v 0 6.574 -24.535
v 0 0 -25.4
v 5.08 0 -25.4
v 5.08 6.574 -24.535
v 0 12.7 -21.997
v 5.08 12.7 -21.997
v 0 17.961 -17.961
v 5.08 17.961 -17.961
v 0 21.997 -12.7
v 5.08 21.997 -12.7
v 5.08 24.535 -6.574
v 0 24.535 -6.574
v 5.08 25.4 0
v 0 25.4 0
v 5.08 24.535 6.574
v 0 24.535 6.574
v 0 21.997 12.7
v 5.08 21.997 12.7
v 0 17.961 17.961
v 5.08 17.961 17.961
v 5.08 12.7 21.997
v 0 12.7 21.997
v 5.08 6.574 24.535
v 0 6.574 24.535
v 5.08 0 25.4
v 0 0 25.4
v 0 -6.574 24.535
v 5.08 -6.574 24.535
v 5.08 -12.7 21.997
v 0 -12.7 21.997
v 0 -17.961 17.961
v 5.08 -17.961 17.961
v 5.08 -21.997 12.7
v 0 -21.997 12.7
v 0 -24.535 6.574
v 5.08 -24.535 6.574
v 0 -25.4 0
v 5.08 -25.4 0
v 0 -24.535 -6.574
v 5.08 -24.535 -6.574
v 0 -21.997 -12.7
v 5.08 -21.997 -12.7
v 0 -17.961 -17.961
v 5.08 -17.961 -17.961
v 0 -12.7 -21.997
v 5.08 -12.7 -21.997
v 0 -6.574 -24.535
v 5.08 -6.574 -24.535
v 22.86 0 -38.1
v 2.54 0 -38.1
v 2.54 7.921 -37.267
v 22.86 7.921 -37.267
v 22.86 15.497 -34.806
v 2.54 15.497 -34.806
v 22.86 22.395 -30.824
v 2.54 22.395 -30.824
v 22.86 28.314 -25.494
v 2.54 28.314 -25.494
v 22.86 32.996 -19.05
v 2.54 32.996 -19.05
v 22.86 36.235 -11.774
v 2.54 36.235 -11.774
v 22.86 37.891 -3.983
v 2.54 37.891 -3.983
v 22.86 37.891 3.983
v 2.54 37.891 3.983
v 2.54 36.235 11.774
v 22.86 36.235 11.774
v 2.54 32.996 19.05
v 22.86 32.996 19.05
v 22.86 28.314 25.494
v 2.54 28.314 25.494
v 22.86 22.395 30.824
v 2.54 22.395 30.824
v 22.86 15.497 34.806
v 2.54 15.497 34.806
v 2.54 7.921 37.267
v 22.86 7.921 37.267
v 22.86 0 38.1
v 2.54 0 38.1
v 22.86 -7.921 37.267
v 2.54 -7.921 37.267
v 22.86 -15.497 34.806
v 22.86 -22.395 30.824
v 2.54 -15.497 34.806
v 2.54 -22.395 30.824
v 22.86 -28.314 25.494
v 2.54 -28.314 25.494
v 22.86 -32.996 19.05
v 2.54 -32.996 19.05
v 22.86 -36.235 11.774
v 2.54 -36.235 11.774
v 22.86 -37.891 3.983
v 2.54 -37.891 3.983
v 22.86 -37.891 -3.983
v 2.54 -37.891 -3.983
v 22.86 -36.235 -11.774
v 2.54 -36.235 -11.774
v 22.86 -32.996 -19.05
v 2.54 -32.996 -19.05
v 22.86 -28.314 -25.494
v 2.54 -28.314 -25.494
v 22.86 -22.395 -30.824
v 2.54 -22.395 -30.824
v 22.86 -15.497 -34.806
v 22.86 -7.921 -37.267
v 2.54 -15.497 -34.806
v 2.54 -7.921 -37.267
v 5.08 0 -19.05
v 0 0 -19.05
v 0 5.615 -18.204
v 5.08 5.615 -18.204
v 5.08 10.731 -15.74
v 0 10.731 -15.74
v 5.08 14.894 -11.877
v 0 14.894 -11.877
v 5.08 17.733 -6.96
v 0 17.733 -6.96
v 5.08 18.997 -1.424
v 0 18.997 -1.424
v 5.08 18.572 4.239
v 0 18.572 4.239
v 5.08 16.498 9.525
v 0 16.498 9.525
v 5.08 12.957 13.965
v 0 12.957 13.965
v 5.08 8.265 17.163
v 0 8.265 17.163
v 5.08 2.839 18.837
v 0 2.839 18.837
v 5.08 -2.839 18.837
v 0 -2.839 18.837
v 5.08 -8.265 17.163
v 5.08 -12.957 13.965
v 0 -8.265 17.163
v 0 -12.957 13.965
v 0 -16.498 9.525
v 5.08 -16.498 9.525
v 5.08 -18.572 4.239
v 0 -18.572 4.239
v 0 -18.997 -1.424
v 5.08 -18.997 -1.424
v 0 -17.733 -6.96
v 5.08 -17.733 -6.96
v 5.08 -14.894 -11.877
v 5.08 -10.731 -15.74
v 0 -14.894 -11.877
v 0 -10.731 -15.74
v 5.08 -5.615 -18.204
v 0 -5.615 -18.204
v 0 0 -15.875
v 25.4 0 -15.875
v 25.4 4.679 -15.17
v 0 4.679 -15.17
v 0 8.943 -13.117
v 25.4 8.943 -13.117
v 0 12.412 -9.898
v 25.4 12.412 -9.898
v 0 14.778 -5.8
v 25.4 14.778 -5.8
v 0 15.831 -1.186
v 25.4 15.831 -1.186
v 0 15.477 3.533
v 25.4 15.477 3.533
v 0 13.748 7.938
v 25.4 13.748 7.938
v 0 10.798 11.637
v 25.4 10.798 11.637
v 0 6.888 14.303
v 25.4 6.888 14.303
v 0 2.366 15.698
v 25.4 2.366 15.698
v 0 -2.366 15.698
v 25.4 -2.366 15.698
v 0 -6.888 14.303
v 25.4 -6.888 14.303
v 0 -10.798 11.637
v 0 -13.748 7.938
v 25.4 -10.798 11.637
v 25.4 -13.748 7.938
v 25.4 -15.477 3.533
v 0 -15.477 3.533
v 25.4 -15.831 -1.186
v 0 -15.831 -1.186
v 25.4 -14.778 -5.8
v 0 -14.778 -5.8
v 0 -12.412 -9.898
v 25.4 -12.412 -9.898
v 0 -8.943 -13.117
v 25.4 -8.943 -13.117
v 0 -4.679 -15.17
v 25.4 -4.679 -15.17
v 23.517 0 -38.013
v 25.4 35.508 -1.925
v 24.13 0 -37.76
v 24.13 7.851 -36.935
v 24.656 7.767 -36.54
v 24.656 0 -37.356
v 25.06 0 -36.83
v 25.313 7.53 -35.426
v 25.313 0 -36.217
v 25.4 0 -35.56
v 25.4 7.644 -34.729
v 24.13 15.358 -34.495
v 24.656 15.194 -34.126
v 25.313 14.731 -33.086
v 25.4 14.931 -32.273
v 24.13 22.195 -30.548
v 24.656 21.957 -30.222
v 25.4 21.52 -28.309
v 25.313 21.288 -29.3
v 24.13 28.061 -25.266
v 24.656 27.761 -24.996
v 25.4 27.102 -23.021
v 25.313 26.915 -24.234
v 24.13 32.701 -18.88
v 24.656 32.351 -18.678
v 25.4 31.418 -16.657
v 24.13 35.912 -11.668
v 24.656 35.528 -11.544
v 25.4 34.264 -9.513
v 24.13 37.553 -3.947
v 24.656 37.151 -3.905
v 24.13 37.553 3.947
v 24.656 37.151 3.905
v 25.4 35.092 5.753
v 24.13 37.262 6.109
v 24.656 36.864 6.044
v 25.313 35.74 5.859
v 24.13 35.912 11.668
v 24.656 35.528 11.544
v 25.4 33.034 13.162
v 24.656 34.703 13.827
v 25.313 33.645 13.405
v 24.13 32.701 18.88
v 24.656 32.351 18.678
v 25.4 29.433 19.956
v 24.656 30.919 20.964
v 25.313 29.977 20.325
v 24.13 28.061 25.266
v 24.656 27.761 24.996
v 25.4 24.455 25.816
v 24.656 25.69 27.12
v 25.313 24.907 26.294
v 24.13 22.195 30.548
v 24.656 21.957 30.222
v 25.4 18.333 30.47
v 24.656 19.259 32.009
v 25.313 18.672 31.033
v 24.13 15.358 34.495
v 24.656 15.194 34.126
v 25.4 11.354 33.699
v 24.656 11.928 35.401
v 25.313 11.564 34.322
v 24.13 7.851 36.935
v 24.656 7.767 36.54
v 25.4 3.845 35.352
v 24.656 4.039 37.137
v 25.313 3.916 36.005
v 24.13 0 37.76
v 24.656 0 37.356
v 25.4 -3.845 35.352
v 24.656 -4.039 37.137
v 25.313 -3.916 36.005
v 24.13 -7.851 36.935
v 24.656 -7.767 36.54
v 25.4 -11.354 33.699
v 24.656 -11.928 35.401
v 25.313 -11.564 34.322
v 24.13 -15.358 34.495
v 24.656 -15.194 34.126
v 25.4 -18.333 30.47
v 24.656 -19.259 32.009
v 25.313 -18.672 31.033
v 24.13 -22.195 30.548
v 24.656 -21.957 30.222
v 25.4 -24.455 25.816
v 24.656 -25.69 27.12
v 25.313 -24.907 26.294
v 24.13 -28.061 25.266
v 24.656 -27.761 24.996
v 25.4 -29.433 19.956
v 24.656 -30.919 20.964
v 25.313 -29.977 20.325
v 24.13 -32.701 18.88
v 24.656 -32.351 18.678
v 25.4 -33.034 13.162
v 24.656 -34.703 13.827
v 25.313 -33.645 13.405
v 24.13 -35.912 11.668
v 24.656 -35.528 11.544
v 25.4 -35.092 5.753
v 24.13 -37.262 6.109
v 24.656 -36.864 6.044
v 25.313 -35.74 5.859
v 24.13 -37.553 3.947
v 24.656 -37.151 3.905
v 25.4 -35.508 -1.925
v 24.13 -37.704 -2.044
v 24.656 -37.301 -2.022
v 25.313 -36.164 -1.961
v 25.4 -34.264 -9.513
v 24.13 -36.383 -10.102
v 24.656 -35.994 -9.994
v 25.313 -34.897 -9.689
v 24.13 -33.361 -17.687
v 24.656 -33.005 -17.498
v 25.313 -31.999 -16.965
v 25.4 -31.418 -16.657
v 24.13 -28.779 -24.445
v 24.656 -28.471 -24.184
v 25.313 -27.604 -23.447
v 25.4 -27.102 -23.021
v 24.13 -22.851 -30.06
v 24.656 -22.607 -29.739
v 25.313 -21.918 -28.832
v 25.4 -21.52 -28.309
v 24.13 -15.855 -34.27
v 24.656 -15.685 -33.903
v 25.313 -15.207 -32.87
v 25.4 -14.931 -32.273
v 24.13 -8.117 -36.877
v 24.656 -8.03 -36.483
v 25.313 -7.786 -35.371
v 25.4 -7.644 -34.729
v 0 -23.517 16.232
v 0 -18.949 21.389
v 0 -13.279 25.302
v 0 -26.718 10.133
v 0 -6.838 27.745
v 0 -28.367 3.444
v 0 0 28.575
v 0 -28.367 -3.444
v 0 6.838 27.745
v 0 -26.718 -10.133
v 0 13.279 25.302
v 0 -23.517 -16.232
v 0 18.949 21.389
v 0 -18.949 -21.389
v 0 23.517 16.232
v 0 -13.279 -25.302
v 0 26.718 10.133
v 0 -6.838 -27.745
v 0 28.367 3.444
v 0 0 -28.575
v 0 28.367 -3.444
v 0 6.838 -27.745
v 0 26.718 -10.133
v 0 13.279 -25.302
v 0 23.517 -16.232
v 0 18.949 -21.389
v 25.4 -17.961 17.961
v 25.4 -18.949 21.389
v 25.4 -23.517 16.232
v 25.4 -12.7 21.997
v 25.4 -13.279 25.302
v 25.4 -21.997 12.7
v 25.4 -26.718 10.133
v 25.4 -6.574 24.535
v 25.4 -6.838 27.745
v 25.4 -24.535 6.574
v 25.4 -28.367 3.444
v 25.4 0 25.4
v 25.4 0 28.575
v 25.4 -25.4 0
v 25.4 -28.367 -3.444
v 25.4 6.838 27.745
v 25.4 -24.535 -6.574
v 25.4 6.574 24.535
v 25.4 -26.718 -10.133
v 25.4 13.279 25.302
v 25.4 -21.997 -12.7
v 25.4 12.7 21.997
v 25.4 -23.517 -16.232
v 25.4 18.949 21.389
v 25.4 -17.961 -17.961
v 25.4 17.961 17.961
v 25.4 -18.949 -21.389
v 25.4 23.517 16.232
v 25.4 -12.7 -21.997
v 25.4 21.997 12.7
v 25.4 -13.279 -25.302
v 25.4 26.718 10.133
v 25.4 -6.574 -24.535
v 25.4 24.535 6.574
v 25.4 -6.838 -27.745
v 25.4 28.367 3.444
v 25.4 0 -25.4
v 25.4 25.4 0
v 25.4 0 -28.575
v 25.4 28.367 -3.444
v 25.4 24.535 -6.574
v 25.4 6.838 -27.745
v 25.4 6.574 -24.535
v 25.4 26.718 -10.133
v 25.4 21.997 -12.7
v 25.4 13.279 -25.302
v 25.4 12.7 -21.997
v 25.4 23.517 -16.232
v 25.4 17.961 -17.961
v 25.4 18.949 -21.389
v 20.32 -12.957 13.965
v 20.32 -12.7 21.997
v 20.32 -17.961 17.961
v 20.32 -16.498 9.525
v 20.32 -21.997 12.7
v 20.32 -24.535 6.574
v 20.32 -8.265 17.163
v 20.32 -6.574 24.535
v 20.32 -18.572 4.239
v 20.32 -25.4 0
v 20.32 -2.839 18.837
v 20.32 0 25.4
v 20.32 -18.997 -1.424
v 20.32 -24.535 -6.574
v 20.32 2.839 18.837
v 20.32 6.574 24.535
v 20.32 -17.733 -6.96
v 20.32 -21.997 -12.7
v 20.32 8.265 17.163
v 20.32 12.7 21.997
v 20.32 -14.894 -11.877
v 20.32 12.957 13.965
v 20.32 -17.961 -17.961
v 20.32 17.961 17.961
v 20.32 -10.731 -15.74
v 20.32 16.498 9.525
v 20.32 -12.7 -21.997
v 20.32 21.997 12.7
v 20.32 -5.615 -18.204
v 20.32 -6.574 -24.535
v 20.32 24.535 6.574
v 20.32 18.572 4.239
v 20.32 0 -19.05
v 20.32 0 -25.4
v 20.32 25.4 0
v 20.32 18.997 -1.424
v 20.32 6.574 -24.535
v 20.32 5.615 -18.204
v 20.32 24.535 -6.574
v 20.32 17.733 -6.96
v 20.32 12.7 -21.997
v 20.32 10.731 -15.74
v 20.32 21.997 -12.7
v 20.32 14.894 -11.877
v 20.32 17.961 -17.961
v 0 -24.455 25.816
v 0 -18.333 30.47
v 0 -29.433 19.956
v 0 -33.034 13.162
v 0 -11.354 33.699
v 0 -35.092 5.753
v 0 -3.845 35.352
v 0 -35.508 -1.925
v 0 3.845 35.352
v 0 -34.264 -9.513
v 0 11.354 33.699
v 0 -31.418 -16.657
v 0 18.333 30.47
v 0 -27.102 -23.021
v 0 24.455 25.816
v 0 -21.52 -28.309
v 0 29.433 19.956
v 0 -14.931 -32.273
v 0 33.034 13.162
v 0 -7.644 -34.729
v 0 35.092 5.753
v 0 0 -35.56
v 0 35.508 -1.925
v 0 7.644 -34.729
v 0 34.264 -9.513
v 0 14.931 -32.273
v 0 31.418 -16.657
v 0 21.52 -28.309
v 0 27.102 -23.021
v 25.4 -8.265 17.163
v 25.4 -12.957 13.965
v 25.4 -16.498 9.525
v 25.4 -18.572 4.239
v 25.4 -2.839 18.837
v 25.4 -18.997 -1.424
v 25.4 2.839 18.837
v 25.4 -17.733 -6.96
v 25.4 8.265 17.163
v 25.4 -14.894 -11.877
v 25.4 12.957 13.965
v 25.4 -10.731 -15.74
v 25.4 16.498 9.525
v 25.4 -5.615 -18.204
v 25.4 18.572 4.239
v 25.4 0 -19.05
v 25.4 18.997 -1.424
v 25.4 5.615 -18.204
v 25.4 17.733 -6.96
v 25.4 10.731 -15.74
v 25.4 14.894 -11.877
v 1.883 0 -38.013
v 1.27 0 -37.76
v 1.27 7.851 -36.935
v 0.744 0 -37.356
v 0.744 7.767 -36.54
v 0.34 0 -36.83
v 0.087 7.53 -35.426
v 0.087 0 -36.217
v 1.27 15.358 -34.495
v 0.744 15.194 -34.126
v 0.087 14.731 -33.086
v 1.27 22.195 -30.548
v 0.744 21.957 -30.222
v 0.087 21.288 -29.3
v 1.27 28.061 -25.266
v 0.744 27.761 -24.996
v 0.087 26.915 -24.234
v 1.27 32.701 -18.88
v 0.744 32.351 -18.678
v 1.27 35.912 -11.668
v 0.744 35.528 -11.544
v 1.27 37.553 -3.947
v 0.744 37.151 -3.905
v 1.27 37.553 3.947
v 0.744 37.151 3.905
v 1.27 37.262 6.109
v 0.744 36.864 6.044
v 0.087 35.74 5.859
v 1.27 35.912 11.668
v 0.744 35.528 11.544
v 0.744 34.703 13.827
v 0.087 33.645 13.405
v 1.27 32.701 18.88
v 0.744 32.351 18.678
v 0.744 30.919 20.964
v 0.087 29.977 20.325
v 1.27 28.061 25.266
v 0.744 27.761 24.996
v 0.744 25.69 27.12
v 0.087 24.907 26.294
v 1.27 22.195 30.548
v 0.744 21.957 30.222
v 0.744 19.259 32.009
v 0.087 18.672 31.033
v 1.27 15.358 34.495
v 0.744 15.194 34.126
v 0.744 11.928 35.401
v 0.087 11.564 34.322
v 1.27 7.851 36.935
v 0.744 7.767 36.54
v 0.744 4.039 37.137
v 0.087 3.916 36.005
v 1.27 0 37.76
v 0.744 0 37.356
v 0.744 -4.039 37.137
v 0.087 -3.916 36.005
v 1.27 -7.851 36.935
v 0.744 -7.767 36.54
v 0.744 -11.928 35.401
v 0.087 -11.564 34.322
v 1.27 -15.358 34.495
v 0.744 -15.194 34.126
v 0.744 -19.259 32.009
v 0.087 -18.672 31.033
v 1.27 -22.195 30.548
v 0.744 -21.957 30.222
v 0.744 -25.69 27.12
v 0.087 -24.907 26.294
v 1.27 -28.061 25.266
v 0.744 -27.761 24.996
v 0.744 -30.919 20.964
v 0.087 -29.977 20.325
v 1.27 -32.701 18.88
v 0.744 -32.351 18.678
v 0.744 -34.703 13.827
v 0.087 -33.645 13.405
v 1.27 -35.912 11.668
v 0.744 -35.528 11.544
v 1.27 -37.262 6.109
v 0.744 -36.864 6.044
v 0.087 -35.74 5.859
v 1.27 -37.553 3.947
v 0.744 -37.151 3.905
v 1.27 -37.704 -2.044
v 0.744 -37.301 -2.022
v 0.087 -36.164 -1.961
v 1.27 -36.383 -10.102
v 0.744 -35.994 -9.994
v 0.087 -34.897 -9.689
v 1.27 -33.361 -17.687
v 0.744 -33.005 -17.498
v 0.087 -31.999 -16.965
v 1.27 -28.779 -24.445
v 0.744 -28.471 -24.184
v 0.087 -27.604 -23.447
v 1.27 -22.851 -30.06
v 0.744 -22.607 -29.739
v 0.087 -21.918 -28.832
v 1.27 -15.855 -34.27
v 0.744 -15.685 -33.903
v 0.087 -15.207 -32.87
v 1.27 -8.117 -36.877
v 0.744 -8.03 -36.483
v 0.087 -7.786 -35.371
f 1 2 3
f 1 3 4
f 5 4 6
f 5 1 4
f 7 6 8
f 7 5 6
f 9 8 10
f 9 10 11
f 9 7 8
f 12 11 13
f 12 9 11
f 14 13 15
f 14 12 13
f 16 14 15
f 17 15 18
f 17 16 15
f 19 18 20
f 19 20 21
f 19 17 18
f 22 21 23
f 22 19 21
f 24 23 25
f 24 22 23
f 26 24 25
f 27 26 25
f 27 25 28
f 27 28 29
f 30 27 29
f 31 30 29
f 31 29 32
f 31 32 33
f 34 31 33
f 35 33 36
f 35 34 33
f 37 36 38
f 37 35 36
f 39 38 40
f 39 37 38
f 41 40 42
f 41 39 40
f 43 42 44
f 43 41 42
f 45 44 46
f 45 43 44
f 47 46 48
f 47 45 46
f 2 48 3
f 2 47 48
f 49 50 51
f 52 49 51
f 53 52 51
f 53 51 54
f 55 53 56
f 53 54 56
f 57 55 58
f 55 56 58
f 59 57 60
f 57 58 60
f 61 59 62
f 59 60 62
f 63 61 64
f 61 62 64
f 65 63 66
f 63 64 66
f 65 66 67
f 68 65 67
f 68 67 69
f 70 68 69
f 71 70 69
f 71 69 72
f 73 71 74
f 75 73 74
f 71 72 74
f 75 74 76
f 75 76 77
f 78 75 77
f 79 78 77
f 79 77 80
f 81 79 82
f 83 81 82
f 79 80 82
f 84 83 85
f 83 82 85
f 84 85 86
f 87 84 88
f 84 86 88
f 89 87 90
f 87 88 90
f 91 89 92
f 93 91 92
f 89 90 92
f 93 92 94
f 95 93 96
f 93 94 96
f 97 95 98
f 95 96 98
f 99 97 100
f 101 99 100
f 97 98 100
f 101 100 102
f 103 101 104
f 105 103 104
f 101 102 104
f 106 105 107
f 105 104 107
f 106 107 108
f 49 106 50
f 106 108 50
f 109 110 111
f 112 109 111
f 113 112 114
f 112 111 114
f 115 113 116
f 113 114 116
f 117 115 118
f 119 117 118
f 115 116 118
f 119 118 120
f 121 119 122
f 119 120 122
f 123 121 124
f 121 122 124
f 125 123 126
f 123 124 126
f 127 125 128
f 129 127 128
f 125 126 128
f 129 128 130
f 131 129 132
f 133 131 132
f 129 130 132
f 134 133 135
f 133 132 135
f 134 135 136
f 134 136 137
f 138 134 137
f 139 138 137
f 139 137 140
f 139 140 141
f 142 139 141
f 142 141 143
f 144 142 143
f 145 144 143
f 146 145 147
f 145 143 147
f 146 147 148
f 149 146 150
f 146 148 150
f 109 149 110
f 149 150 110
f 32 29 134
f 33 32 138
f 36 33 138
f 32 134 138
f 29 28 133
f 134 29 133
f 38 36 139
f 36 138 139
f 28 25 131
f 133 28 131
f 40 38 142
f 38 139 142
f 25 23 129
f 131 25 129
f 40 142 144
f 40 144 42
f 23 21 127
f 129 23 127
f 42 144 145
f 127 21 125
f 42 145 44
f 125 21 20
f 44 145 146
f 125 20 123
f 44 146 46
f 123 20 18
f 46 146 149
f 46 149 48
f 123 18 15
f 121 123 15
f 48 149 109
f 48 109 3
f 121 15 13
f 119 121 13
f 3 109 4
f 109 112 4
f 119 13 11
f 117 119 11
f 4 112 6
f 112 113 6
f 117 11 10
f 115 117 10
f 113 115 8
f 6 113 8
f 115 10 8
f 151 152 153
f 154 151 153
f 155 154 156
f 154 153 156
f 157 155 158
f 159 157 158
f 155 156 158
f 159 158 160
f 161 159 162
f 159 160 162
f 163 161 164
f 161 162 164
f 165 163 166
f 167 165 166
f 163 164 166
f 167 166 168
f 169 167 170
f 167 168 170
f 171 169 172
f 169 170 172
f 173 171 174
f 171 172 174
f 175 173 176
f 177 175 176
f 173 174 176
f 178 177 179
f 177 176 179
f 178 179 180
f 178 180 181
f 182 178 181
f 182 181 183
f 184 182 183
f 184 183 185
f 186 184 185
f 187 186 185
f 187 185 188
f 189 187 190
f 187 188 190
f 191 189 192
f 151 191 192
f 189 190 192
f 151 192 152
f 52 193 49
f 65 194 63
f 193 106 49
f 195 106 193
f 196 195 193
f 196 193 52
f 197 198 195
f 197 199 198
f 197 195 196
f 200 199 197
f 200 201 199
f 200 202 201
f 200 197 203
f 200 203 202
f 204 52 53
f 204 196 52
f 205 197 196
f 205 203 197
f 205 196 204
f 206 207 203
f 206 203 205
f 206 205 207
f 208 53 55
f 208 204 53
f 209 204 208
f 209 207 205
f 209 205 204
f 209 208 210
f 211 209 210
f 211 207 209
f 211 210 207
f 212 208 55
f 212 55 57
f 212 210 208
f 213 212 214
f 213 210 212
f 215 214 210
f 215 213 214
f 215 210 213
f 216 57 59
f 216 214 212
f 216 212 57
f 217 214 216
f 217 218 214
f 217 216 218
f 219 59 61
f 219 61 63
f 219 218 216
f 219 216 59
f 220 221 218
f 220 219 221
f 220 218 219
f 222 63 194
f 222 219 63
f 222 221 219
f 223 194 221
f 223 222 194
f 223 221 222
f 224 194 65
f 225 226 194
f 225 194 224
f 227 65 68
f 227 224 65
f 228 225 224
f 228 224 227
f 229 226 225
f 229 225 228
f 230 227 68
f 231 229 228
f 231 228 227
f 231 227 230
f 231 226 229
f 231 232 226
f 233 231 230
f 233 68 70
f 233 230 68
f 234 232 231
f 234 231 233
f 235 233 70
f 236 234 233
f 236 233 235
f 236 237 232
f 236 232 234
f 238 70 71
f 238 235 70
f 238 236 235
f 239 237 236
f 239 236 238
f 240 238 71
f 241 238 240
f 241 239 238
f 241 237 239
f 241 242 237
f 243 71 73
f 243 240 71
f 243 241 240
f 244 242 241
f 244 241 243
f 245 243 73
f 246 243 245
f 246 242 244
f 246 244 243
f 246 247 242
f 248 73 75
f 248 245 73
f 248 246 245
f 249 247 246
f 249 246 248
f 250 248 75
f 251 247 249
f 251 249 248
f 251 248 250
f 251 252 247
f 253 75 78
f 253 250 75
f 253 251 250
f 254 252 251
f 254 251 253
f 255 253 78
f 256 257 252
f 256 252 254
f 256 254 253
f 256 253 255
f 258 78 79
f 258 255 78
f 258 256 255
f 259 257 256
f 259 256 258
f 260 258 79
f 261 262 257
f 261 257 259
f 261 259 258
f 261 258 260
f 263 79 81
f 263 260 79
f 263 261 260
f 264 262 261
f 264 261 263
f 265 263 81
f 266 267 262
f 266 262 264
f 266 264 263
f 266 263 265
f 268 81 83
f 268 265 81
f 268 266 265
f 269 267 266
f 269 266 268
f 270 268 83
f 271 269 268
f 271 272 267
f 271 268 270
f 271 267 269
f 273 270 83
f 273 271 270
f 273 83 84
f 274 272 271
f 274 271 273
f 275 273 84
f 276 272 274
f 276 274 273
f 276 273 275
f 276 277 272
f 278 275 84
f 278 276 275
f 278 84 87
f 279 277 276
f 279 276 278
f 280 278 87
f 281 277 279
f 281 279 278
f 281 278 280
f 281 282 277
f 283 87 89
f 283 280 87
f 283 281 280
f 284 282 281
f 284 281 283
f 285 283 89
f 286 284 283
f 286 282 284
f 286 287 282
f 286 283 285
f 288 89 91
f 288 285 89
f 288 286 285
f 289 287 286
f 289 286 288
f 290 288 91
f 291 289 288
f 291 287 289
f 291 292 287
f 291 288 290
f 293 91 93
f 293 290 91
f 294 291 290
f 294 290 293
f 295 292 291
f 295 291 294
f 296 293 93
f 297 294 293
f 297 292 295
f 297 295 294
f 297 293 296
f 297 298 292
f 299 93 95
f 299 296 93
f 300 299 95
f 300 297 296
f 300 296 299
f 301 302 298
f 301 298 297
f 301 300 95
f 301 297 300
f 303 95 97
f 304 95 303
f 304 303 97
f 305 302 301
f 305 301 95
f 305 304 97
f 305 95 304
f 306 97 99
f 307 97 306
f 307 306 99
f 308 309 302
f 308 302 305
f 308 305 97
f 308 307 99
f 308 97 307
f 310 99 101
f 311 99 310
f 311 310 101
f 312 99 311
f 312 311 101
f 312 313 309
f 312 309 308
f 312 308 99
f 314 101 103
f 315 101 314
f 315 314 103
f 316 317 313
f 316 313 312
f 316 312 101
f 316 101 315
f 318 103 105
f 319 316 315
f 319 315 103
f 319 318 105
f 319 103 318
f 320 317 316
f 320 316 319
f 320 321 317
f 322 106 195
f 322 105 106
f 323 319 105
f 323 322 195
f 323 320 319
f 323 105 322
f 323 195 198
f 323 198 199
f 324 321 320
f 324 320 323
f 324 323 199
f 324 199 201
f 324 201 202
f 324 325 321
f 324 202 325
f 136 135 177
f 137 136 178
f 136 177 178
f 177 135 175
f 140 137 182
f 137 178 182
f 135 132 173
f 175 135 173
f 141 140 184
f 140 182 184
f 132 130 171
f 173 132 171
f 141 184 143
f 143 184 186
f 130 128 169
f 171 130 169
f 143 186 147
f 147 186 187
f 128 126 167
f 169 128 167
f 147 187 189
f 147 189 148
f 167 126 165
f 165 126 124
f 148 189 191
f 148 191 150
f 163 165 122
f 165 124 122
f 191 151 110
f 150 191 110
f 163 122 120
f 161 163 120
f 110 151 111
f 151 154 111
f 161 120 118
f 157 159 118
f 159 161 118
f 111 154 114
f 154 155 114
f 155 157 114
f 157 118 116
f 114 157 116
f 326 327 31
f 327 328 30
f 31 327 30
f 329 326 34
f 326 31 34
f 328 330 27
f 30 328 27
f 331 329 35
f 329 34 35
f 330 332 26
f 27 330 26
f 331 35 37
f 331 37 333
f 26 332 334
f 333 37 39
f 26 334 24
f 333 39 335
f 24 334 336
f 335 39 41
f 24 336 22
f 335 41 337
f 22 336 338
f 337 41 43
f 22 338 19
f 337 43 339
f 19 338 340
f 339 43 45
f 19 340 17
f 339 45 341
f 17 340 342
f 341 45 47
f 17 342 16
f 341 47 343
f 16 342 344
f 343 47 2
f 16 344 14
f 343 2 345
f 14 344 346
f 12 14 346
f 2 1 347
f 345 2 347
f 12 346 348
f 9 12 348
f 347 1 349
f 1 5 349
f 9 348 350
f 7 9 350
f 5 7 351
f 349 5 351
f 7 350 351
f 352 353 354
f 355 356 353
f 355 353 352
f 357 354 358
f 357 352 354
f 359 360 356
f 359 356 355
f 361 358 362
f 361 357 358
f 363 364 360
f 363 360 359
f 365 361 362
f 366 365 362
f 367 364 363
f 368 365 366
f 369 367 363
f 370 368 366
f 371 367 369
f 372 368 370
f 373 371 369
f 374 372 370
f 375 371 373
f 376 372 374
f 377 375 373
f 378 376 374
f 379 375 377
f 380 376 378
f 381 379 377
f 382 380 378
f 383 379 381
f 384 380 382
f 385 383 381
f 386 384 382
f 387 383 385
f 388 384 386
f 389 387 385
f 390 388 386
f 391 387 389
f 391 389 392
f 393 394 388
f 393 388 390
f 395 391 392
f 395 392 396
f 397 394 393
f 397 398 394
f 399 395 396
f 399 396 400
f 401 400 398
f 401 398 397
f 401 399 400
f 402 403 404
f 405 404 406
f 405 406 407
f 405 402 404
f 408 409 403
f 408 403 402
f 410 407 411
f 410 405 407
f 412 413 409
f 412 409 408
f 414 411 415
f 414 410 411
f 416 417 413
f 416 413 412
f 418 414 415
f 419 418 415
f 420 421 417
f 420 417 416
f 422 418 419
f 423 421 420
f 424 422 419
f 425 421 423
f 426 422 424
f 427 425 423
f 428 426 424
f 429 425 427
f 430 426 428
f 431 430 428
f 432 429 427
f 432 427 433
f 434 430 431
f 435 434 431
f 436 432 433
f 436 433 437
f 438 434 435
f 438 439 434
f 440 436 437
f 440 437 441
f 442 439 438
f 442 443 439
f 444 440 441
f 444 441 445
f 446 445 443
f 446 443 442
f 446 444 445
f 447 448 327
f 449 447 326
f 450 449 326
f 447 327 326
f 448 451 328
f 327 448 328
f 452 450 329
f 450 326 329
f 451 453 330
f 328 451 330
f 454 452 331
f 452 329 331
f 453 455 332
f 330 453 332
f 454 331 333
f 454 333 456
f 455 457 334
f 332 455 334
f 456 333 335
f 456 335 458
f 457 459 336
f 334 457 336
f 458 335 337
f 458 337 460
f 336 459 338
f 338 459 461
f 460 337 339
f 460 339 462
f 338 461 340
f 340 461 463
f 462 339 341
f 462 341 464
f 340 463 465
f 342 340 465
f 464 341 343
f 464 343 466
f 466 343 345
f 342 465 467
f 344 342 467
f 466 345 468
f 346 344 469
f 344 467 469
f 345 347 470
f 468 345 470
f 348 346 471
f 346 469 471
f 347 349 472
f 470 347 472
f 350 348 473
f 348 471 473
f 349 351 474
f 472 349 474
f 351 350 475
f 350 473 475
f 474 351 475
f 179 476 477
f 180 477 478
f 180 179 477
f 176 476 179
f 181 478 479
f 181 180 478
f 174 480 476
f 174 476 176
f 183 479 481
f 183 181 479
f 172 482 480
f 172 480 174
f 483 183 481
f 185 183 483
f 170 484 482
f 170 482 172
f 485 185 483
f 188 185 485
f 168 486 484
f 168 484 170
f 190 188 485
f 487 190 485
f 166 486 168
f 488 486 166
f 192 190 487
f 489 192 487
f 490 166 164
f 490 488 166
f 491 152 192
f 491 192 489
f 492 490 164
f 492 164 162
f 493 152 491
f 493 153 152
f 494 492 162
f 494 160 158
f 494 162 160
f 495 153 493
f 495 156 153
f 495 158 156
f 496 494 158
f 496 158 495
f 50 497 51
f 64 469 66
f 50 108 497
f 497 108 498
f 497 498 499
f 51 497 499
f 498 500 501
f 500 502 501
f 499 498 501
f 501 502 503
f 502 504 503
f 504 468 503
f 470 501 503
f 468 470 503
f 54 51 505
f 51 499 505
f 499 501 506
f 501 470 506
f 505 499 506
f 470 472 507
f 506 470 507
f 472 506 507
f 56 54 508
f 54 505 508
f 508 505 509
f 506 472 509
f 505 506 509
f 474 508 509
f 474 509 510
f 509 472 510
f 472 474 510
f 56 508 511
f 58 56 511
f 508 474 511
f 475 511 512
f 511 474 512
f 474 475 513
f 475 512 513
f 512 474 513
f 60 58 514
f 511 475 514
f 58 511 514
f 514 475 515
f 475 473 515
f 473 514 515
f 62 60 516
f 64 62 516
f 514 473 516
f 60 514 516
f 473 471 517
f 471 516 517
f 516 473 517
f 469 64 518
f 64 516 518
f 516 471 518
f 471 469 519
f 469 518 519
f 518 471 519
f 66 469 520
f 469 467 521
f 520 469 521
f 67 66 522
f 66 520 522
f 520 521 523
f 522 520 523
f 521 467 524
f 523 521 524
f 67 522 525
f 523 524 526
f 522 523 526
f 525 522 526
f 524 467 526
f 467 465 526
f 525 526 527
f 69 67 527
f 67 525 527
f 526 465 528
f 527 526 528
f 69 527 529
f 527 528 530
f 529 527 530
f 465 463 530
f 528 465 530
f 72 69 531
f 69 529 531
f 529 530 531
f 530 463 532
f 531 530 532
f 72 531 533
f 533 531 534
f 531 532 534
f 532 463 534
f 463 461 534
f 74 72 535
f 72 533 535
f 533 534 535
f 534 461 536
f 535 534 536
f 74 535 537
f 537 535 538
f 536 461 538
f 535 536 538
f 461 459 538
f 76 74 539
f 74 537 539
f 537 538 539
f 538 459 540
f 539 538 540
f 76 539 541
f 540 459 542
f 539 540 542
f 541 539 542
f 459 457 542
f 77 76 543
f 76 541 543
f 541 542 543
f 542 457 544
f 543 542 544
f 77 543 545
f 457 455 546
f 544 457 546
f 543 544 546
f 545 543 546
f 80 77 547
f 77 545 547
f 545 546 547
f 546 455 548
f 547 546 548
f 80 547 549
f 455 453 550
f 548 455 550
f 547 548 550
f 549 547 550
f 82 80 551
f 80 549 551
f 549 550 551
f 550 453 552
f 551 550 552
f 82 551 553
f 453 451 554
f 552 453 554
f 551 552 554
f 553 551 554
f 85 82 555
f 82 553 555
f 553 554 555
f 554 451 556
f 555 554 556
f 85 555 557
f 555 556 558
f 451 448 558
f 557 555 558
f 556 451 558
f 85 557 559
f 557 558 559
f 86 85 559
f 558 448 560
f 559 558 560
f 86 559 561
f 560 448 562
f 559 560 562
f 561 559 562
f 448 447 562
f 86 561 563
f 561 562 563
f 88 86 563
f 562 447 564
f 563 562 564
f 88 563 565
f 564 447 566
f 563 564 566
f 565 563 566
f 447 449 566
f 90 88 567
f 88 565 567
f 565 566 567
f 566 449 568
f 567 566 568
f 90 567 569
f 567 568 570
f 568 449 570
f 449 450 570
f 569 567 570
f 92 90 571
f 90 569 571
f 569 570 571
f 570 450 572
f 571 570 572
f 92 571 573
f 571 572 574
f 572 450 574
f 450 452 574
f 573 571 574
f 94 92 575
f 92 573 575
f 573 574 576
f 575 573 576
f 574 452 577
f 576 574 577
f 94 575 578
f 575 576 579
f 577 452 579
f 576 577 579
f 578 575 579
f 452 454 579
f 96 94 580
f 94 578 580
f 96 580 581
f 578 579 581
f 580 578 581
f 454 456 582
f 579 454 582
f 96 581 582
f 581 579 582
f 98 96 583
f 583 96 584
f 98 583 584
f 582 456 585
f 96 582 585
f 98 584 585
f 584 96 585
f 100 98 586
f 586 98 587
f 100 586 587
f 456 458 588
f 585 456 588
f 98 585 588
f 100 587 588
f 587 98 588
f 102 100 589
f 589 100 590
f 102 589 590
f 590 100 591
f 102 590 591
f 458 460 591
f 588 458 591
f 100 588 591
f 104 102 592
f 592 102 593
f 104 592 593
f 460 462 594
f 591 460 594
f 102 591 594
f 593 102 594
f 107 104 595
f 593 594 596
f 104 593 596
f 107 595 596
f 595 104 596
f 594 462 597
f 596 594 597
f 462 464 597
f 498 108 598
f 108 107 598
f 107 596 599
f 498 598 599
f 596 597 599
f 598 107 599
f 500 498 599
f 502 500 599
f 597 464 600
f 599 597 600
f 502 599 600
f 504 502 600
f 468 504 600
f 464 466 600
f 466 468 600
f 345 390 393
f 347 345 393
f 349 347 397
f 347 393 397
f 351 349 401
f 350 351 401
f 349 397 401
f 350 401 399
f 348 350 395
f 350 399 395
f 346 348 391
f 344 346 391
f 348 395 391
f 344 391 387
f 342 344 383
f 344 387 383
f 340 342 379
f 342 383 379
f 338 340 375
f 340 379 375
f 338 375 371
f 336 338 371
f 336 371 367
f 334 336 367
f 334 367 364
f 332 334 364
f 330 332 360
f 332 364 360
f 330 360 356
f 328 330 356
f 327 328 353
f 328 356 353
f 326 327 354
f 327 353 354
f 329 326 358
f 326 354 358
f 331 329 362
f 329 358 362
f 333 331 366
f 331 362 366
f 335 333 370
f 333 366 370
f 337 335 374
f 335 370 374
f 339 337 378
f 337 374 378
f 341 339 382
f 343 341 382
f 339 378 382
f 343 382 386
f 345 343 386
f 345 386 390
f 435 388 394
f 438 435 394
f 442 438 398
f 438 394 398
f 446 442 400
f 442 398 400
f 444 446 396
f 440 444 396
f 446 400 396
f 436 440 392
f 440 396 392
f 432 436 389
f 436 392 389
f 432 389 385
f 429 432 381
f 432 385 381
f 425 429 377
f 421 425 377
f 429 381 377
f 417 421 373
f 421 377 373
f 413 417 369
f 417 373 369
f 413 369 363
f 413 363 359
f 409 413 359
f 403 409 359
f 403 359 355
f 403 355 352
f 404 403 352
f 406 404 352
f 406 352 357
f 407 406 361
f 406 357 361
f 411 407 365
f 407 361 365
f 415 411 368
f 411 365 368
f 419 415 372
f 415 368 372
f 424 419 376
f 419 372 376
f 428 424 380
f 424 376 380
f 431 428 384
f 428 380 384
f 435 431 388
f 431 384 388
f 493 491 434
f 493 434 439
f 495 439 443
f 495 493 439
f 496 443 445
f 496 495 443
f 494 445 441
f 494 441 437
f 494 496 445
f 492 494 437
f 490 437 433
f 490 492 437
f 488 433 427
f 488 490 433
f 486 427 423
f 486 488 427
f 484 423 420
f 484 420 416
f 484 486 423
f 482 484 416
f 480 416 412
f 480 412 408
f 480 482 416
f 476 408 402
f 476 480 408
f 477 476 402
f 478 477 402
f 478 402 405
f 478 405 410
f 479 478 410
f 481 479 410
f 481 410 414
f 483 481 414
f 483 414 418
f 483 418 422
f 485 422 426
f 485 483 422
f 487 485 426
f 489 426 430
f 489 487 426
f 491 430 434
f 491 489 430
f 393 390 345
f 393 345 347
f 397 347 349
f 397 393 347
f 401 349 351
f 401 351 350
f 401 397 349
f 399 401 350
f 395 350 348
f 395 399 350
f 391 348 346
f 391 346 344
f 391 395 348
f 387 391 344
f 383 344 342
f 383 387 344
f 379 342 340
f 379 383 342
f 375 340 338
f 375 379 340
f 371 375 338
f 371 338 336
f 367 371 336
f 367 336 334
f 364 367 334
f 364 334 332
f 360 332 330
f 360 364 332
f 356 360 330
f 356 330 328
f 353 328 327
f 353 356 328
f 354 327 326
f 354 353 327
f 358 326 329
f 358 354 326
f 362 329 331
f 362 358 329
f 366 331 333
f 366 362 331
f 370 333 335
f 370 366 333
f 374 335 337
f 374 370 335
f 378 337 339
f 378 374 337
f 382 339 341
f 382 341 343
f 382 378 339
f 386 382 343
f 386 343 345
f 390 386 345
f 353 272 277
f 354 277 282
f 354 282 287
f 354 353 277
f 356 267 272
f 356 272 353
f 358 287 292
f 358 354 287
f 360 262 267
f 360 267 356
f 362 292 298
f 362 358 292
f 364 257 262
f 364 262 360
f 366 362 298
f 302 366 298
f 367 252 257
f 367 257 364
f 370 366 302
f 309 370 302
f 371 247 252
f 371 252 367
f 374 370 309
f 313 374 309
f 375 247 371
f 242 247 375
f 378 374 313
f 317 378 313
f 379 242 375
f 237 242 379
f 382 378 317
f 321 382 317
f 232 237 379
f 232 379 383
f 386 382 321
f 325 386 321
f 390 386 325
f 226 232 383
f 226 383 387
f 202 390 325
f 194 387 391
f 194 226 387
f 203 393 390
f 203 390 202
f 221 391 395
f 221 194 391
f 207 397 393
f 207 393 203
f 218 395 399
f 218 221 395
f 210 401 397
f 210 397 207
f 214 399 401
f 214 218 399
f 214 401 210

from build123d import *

# Parameters (mm, degrees)
SKETCH1_R           = 38.1
BOSS_EXTRUDE1_DEPTH = 25.4
FILLET2_R           = 2.54
SKETCH2_R           = 28.575
CUT_EXTRUDE1_DEPTH  = 25.4
SKETCH3_R           = 28.575
BOSS_EXTRUDE3_DEPTH = 25.4
SKETCH7_R           = 25.4
SKETCH7_R_2         = 19.05
CUT_EXTRUDE3_DEPTH  = 5.08
SKETCH8_R           = 15.875
CUT_EXTRUDE4_DEPTH  = 25.4


with BuildPart() as part:
    # Sketch1 → Boss-Extrude1 (new body)
    with BuildSketch(Plane(origin=(0, 0, 0), x_dir=(0, 0, -1), z_dir=(1, 0, 0))):
        Circle(SKETCH1_R)
    extrude(amount=BOSS_EXTRUDE1_DEPTH)

    # Fillet2
    fillet2_edges = [part.edges().sort_by_distance(p)[0] for p in [
        (0, 0, 38.1),
        (25.4, 0, 38.1),
    ]]
    fillet(fillet2_edges, radius=FILLET2_R)

    # Sketch2 → Cut-Extrude1 (cut)
    with BuildSketch(Plane(origin=(25.4, 0, 0), x_dir=(0, 0, -1), z_dir=(1, 0, 0))):
        Circle(SKETCH2_R)
    extrude(amount=-CUT_EXTRUDE1_DEPTH, mode=Mode.SUBTRACT)


with BuildPart() as body_2:
    # Sketch3 → Boss-Extrude3 (new body)
    with BuildSketch(Plane(origin=(25.4, 0, 0), x_dir=(0, 0, -1), z_dir=(1, 0, 0))):
        Circle(SKETCH3_R)
    extrude(amount=-BOSS_EXTRUDE3_DEPTH)

    # Sketch7 → Cut-Extrude3 (cut)
    with BuildSketch(Plane(origin=(25.4, 0, 0), x_dir=(0, 0, -1), z_dir=(1, 0, 0))):
        Circle(SKETCH7_R)
        Circle(SKETCH7_R_2, mode=Mode.SUBTRACT)
    cut_extrude3 = extrude(amount=-CUT_EXTRUDE3_DEPTH, mode=Mode.SUBTRACT)

    # Sketch8 → Cut-Extrude4 (cut)
    with BuildSketch(Plane(origin=(25.4, 0, 0), x_dir=(0, 0, -1), z_dir=(1, 0, 0))):
        Circle(SKETCH8_R)
    extrude(amount=-CUT_EXTRUDE4_DEPTH, mode=Mode.SUBTRACT)

    # Mirror1: Cut-Extrude3 across plane
    add(cut_extrude3.mirror(Plane.ZY.offset(-12.7)), mode=Mode.SUBTRACT)


solid = Compound([part.part, body_2.part])
